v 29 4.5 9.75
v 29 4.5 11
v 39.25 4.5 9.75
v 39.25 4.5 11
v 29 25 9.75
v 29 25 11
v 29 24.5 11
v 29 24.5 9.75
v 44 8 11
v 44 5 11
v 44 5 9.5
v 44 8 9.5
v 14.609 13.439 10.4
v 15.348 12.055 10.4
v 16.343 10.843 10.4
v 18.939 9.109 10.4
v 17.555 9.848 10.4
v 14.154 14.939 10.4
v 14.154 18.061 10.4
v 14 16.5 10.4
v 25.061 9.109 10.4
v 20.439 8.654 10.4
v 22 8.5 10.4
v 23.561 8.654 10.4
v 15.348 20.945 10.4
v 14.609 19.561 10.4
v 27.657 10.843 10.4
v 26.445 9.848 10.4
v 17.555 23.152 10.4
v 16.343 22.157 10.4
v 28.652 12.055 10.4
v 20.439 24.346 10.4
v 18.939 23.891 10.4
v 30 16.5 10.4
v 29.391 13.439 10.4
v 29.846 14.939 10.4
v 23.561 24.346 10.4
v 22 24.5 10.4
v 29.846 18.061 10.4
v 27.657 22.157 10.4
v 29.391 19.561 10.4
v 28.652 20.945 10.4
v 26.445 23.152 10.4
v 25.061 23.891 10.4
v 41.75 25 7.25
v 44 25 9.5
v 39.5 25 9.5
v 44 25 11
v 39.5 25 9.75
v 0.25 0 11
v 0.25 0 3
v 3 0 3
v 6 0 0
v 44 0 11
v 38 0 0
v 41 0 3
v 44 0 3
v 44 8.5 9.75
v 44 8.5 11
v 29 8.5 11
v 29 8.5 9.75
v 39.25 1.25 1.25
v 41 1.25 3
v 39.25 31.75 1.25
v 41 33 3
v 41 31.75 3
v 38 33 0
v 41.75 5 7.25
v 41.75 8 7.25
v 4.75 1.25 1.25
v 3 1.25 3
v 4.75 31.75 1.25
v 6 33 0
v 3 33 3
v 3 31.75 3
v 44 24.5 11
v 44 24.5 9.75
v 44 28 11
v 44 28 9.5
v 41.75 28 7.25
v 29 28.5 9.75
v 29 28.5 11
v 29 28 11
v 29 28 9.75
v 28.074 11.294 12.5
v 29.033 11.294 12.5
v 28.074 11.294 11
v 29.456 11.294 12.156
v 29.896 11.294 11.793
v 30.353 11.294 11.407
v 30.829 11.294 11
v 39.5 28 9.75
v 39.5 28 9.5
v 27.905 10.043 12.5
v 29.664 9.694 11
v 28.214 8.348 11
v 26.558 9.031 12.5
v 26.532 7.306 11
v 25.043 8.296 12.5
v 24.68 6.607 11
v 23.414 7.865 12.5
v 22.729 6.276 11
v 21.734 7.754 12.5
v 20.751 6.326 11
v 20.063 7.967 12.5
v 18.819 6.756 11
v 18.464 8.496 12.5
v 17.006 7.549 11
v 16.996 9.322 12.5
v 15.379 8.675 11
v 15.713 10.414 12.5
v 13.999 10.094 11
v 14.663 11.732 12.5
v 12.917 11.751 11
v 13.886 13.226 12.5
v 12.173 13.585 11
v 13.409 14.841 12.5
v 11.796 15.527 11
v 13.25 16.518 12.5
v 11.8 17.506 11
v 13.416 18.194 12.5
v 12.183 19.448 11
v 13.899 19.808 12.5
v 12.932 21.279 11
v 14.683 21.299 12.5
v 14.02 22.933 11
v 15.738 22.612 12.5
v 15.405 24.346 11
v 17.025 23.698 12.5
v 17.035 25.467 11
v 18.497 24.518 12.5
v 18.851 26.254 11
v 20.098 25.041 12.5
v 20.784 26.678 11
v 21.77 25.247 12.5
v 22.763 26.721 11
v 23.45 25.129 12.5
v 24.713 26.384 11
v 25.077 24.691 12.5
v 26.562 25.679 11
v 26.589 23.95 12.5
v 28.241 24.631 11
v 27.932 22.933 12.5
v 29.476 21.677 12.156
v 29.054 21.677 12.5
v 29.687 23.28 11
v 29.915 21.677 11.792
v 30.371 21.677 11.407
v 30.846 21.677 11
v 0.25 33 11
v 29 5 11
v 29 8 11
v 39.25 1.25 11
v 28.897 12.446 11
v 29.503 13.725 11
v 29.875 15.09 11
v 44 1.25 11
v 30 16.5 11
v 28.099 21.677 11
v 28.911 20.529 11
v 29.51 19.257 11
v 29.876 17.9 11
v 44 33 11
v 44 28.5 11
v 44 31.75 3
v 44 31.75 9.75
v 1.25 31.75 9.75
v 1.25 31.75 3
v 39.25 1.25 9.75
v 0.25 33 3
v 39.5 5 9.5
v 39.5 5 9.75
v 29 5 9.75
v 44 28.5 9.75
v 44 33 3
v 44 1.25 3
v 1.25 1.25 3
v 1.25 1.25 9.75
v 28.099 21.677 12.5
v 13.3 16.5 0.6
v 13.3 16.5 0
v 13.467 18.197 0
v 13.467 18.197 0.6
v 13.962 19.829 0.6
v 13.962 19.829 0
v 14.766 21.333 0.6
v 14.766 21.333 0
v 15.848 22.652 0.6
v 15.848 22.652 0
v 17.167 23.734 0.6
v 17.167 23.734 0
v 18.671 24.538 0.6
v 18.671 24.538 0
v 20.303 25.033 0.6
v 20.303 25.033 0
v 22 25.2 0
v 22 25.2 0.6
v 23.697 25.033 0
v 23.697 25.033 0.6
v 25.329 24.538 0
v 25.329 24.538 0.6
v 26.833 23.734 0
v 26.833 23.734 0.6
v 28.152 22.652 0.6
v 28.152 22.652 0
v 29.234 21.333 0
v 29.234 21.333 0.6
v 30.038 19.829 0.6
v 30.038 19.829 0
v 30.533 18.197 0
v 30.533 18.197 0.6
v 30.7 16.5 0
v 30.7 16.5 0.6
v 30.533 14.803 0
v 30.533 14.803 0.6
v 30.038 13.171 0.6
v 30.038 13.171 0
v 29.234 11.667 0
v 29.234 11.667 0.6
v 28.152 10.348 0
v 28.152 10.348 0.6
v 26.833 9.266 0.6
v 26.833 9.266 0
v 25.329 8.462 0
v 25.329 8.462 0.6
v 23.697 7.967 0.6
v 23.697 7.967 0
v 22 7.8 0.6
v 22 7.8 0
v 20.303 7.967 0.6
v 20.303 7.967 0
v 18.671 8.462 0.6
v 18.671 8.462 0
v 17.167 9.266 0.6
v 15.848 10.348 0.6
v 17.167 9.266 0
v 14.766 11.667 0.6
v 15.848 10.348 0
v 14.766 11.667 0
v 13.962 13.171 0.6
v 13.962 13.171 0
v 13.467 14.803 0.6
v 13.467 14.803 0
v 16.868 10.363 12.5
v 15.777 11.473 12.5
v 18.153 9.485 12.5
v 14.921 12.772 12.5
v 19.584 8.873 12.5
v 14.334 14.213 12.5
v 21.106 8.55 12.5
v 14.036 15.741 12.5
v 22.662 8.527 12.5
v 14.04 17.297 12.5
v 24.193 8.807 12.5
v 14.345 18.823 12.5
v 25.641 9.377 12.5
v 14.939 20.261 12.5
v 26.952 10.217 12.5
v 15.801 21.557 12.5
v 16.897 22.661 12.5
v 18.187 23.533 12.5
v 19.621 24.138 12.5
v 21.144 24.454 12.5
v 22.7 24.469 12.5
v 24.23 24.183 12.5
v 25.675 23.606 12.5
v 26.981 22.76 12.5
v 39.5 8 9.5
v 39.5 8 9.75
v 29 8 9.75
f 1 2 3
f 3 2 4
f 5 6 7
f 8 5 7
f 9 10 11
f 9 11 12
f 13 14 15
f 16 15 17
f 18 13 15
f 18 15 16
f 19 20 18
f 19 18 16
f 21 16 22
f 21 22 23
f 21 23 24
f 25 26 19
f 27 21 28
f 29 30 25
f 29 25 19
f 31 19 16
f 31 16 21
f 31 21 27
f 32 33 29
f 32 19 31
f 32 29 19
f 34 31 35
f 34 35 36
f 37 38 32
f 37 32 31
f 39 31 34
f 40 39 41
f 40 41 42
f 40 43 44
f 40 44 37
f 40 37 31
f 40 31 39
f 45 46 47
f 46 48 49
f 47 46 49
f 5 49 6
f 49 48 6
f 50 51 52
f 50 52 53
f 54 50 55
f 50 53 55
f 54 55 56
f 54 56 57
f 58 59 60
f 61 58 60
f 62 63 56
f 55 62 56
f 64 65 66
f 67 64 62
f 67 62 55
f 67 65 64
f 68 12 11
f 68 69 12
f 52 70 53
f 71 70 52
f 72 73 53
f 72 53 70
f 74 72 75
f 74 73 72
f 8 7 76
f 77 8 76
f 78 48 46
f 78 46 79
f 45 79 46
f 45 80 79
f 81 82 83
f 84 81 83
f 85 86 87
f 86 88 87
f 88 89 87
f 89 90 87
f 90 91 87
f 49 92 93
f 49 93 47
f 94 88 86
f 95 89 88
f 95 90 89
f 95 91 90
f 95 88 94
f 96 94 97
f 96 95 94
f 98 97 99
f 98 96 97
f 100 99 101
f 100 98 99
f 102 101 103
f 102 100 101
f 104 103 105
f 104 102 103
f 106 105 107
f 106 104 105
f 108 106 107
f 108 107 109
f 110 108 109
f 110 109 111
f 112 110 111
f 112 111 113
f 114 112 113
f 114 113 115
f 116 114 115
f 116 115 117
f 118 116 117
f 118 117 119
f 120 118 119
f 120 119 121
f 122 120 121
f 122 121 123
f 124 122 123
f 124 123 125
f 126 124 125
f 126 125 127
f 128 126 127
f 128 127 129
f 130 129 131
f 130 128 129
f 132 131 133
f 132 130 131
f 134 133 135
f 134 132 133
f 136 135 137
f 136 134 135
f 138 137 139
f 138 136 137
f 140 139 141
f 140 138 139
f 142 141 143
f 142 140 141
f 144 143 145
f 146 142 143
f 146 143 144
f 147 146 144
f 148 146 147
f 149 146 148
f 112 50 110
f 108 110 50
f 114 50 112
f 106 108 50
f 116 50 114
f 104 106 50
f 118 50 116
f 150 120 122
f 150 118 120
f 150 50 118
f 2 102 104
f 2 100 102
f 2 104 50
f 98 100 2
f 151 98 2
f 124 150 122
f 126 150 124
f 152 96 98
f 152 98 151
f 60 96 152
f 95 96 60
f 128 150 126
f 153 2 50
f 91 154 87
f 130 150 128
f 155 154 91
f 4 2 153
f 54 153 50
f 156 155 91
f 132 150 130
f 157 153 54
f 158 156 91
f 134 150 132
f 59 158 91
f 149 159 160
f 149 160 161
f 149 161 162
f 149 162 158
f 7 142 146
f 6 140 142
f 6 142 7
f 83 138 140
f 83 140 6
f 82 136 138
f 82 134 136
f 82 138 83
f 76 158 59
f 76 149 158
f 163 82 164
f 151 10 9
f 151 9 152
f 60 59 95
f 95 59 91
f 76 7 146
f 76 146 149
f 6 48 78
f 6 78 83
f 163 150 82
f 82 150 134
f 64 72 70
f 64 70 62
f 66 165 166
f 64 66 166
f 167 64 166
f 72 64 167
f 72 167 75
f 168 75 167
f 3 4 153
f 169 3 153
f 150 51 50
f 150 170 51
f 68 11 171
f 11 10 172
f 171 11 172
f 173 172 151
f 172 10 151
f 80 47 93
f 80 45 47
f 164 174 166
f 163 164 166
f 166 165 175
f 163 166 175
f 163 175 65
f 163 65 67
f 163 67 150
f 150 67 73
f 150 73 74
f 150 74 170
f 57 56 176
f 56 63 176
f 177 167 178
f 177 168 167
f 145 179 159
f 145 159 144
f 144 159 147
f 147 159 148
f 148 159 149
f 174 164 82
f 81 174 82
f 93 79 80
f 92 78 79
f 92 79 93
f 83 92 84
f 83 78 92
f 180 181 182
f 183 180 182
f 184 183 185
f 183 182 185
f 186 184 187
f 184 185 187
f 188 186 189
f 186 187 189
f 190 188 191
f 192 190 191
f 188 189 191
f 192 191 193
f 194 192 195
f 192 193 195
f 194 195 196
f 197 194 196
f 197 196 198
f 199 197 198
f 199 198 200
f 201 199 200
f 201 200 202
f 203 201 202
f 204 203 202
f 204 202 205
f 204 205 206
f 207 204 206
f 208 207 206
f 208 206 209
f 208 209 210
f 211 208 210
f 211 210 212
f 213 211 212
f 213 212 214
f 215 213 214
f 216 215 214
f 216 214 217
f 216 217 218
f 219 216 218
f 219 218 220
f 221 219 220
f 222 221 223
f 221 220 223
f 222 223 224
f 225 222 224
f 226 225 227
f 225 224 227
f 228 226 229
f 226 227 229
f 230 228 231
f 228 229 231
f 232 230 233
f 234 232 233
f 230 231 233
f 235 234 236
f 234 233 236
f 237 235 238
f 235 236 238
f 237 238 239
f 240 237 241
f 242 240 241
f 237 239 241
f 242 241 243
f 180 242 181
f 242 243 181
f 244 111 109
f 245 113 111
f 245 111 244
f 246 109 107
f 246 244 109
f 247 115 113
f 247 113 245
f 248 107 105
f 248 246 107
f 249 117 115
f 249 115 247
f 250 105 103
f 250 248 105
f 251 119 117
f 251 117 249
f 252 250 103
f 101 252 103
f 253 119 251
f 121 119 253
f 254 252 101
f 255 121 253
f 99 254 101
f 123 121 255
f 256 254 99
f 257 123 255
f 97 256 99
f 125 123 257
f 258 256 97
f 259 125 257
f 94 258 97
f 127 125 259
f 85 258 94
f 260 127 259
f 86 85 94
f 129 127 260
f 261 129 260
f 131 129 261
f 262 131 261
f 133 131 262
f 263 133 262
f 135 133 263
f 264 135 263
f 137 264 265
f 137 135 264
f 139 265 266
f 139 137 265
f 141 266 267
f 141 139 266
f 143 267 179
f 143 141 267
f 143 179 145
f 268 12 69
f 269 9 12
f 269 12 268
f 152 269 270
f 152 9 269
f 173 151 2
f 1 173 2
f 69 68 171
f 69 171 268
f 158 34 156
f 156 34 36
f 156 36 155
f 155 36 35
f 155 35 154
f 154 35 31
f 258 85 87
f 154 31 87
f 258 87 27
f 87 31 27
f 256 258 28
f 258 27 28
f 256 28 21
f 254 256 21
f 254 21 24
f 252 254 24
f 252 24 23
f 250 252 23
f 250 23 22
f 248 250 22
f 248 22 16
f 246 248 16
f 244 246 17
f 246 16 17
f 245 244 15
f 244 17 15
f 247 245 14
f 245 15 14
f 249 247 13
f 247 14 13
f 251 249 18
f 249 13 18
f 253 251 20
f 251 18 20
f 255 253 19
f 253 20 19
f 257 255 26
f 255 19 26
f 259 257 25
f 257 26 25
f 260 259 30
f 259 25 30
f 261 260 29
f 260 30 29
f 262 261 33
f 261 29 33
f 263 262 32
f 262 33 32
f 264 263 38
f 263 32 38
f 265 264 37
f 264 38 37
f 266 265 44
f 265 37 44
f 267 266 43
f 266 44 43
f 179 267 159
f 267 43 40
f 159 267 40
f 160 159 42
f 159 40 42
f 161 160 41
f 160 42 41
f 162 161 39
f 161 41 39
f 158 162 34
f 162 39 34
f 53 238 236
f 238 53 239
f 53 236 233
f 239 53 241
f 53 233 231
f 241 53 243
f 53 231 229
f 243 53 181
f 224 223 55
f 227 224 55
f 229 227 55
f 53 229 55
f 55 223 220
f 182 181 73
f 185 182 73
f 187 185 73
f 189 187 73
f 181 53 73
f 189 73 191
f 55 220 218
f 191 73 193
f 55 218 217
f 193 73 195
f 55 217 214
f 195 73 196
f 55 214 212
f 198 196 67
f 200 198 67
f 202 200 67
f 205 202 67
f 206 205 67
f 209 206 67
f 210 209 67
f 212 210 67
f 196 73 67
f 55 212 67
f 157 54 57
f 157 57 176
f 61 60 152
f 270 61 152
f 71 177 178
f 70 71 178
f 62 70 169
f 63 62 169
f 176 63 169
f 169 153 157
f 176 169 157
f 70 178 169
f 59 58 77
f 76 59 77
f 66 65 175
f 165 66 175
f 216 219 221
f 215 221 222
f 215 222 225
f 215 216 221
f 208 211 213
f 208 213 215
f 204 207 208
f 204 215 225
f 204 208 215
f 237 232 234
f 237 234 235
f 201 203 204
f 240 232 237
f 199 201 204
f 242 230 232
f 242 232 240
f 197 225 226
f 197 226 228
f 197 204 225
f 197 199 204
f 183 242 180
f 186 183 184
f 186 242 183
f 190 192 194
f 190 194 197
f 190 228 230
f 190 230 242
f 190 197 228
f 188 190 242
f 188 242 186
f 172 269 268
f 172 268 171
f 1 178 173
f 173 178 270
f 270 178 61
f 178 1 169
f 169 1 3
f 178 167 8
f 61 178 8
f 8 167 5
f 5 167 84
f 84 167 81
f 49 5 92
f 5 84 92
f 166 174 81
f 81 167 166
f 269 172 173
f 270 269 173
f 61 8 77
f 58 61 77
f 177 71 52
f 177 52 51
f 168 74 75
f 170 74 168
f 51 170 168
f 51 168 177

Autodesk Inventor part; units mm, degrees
ref_plane "YZ Plane" through (0, 0, 0) normal (1, 0, 0) x (0, 1, 0)
ref_plane "XZ Plane" through (0, 0, 0) normal (0, 1, 0) x (-1, 0, 0)
ref_plane "XY Plane" through (0, 0, 0) normal (0, 0, 1) x (1, 0, 0)
sketch "Sketch1" plane through (0, 0, 0) normal (0, 0, 1) x (1, 0, 0)
  line L0 (0, 0) -> (44, 0)
  line L1 (44, 0) -> (44, 33)
  line L2 (44, 33) -> (0, 33)
  line L3 (0, 33) -> (0, 0)
  line L4 (2, 1.5) -> (44, 1.5)
  line L5 (44, 1.5) -> (44, 31.5)
  line L6 (44, 31.5) -> (2, 31.5)
  line L7 (2, 31.5) -> (2, 1.5)
  dimension "d0" = 44
  dimension "d1" = 33
  dimension "d2" = 42
  dimension "d3" = 30
  dimension "d4" = 2
  dimension "d5" = 0
  dimension "d6" = 1.5
extrude "Extrusion1" add sketch "Sketch1" along normal blind 11
shell "Shell1" thickness 1.25 removed faces 1 at (44, 11, 3.6667)
sketch "Sketch2" plane through (0, 0, 11) normal (0, 0, 1) x (1, 0, 0)
  circle A0 centre (22, 16.5) radius 8
  circle A1 centre (22, 16.5) radius 8.75
  point P0 (0, 0)
  dimension "d10" = 16
  dimension "d11" = 17.5
extrude "Extrusion2" add sketch "Sketch2" along normal blind 1.5
sketch "Sketch3" plane through (22, 16.5, 11) normal (0, 0, 1) x (1, 0, 0)
  line L0 (1.47, 5.1769) -> (11.6334, 5.1769)
  line L1 (11.6334, 5.1769) -> (11.6334, -5.2059)
  line L2 (11.6334, -5.2059) -> (1.47, -5.2059)
  line L3 (1.47, -5.2059) -> (1.47, 5.1769)
  line L4 (1.47, 5.1769) -> (11.6334, -5.2059) construction
  line L5 (11.6334, 5.1769) -> (1.47, -5.2059) construction
  point P0 (-22, -16.5)
  point P1 (6.5517, -0.0145)
extrude "Extrusion3" cut sketch "Sketch2" against normal blind 0.6 contours A0
sketch "Sketch4" plane through (0, 0, 0) normal (0, 0, -1) x (-1, 0, 0)
  circle A0 centre (-22, 16.5) radius 8.7
  line L0 (-44, 33) -> (0, 33) projected
  line L1 (0, 33) -> (0, 0) projected
  dimension "d16" = 17.4
  dimension "d22" = 16.5
  dimension "d23" = 22
extrude "Extrusion4" cut sketch "Sketch4" against normal blind 0.6
chamfer "Chamfer1" distance 1.5 angle 45 1 edges at (13.25, 16.5, 11)
extrude "Extrusion5" cut sketch "Sketch3" along normal blind 2
sketch "Sketch5" plane through (0, 33, 0) normal (0, 1, 0) x (1, 0, 0)
  line L0 (0, 0) -> (3, 0)
  line L1 (3, 0) -> (3, -3)
  line L2 (3, -3) -> (0, -3)
  line L3 (0, -3) -> (0, 0)
  line L4 (0, 0) -> (44, 0) projected
  line L5 (44, 0) -> (41, 0)
  line L6 (41, 0) -> (41, -3)
  line L7 (41, -3) -> (44, -3)
  line L8 (44, -3) -> (44, 0)
  dimension "d26" = 3
  dimension "d27" = 3
  dimension "d28" = 3
  dimension "d29" = 3
extrude "Extrusion6" cut sketch "Sketch5" against normal through all
sketch "Sketch6" plane through (0, 0, 11) normal (-1, 0, 0) x (0, 0, 1)
  line L0 (0, 0) -> (0, 33) projected
  line L1 (-11, 33) -> (-11, 0) projected
  line L2 (0, 0) -> (-11, 0)
  line L3 (-11, 0) -> (-11, 33)
  line L4 (-11, 33) -> (0, 33)
  line L5 (0, 33) -> (0, 0)
extrude "Extrusion7" cut sketch "Sketch6" against normal blind 0.25
chamfer "Chamfer2" distance 3 angle 45 2 edges at (3, 16.5, 0) (41, 16.5, 0)
sketch "Sketch7" plane through (0, 0, 11) normal (0, 0, 1) x (1, 0, 0)
  line L0 (44, 1.25) -> (44, 31.75) projected
  line L1 (44, 28) -> (29, 28)
  line L2 (29, 28) -> (29, 25)
  line L3 (29, 25) -> (44, 25)
  line L4 (44, 25) -> (44, 28)
  line L5 (44, 33) -> (0.25, 33) projected
  line L6 (44, 28.5) -> (29, 28.5)
  line L7 (29, 28.5) -> (29, 24.5)
  line L8 (29, 24.5) -> (44, 24.5)
  line L9 (44, 24.5) -> (44, 28.5)
  point P0 (0, 0)
  dimension "d37" = 15
  dimension "d38" = 3
  dimension "d39" = 5
  dimension "d40" = 4
extrude "Extrusion8" cut sketch "Sketch7" against normal blind 1.5 contours L8 L7 L3 L0 | L1 L7 L6 L0
sketch "Sketch8" plane through (44, 1.25, 9.75) normal (0, 0, -1) x (-1, 0, 0)
  line L0 (0, 26.75) -> (15, 26.75) projected
  line L1 (0, 23.75) -> (15, 23.75) projected
  line L2 (0, 26.75) -> (4.5, 26.75)
  line L3 (4.5, 26.75) -> (4.5, 23.75)
  line L4 (4.5, 23.75) -> (0, 23.75)
  line L5 (0, 23.75) -> (0, 26.75)
  point P0 (44, -1.25)
  point P1 (4.5, 26.75)
  dimension "d43" = 4.5
extrude "Extrusion9" add sketch "Sketch8" along normal blind 2.5
chamfer "Chamfer3" distance 2.25 angle 45 2 edges at (44, 26.5, 7.25) (39.5, 26.5, 7.25)
pattern_linear "Rectangular Pattern1" count 2 spacing 20 along (0, -1, 0) of "Extrusion9", "Chamfer3", "Extrusion8"
sketch "Sketch9" plane through (0, 0, 11) normal (0, 0, 1) x (1, 0, 0)
  line L0 (44, 4.5) -> (29, 4.5) projected
  line L1 (4.75, 1.25) -> (39.25, 1.25) projected
  line L2 (44, 4.5) -> (39.25, 4.5)
  line L3 (39.25, 4.5) -> (39.25, 1.25)
  line L4 (39.25, 1.25) -> (44, 1.25)
  line L5 (44, 1.25) -> (44, 4.5)
  point P0 (0, 0)
extrude "Extrusion10" cut sketch "Sketch9" against normal blind 2.5
properties part number "ButtonBatteryHolder"
